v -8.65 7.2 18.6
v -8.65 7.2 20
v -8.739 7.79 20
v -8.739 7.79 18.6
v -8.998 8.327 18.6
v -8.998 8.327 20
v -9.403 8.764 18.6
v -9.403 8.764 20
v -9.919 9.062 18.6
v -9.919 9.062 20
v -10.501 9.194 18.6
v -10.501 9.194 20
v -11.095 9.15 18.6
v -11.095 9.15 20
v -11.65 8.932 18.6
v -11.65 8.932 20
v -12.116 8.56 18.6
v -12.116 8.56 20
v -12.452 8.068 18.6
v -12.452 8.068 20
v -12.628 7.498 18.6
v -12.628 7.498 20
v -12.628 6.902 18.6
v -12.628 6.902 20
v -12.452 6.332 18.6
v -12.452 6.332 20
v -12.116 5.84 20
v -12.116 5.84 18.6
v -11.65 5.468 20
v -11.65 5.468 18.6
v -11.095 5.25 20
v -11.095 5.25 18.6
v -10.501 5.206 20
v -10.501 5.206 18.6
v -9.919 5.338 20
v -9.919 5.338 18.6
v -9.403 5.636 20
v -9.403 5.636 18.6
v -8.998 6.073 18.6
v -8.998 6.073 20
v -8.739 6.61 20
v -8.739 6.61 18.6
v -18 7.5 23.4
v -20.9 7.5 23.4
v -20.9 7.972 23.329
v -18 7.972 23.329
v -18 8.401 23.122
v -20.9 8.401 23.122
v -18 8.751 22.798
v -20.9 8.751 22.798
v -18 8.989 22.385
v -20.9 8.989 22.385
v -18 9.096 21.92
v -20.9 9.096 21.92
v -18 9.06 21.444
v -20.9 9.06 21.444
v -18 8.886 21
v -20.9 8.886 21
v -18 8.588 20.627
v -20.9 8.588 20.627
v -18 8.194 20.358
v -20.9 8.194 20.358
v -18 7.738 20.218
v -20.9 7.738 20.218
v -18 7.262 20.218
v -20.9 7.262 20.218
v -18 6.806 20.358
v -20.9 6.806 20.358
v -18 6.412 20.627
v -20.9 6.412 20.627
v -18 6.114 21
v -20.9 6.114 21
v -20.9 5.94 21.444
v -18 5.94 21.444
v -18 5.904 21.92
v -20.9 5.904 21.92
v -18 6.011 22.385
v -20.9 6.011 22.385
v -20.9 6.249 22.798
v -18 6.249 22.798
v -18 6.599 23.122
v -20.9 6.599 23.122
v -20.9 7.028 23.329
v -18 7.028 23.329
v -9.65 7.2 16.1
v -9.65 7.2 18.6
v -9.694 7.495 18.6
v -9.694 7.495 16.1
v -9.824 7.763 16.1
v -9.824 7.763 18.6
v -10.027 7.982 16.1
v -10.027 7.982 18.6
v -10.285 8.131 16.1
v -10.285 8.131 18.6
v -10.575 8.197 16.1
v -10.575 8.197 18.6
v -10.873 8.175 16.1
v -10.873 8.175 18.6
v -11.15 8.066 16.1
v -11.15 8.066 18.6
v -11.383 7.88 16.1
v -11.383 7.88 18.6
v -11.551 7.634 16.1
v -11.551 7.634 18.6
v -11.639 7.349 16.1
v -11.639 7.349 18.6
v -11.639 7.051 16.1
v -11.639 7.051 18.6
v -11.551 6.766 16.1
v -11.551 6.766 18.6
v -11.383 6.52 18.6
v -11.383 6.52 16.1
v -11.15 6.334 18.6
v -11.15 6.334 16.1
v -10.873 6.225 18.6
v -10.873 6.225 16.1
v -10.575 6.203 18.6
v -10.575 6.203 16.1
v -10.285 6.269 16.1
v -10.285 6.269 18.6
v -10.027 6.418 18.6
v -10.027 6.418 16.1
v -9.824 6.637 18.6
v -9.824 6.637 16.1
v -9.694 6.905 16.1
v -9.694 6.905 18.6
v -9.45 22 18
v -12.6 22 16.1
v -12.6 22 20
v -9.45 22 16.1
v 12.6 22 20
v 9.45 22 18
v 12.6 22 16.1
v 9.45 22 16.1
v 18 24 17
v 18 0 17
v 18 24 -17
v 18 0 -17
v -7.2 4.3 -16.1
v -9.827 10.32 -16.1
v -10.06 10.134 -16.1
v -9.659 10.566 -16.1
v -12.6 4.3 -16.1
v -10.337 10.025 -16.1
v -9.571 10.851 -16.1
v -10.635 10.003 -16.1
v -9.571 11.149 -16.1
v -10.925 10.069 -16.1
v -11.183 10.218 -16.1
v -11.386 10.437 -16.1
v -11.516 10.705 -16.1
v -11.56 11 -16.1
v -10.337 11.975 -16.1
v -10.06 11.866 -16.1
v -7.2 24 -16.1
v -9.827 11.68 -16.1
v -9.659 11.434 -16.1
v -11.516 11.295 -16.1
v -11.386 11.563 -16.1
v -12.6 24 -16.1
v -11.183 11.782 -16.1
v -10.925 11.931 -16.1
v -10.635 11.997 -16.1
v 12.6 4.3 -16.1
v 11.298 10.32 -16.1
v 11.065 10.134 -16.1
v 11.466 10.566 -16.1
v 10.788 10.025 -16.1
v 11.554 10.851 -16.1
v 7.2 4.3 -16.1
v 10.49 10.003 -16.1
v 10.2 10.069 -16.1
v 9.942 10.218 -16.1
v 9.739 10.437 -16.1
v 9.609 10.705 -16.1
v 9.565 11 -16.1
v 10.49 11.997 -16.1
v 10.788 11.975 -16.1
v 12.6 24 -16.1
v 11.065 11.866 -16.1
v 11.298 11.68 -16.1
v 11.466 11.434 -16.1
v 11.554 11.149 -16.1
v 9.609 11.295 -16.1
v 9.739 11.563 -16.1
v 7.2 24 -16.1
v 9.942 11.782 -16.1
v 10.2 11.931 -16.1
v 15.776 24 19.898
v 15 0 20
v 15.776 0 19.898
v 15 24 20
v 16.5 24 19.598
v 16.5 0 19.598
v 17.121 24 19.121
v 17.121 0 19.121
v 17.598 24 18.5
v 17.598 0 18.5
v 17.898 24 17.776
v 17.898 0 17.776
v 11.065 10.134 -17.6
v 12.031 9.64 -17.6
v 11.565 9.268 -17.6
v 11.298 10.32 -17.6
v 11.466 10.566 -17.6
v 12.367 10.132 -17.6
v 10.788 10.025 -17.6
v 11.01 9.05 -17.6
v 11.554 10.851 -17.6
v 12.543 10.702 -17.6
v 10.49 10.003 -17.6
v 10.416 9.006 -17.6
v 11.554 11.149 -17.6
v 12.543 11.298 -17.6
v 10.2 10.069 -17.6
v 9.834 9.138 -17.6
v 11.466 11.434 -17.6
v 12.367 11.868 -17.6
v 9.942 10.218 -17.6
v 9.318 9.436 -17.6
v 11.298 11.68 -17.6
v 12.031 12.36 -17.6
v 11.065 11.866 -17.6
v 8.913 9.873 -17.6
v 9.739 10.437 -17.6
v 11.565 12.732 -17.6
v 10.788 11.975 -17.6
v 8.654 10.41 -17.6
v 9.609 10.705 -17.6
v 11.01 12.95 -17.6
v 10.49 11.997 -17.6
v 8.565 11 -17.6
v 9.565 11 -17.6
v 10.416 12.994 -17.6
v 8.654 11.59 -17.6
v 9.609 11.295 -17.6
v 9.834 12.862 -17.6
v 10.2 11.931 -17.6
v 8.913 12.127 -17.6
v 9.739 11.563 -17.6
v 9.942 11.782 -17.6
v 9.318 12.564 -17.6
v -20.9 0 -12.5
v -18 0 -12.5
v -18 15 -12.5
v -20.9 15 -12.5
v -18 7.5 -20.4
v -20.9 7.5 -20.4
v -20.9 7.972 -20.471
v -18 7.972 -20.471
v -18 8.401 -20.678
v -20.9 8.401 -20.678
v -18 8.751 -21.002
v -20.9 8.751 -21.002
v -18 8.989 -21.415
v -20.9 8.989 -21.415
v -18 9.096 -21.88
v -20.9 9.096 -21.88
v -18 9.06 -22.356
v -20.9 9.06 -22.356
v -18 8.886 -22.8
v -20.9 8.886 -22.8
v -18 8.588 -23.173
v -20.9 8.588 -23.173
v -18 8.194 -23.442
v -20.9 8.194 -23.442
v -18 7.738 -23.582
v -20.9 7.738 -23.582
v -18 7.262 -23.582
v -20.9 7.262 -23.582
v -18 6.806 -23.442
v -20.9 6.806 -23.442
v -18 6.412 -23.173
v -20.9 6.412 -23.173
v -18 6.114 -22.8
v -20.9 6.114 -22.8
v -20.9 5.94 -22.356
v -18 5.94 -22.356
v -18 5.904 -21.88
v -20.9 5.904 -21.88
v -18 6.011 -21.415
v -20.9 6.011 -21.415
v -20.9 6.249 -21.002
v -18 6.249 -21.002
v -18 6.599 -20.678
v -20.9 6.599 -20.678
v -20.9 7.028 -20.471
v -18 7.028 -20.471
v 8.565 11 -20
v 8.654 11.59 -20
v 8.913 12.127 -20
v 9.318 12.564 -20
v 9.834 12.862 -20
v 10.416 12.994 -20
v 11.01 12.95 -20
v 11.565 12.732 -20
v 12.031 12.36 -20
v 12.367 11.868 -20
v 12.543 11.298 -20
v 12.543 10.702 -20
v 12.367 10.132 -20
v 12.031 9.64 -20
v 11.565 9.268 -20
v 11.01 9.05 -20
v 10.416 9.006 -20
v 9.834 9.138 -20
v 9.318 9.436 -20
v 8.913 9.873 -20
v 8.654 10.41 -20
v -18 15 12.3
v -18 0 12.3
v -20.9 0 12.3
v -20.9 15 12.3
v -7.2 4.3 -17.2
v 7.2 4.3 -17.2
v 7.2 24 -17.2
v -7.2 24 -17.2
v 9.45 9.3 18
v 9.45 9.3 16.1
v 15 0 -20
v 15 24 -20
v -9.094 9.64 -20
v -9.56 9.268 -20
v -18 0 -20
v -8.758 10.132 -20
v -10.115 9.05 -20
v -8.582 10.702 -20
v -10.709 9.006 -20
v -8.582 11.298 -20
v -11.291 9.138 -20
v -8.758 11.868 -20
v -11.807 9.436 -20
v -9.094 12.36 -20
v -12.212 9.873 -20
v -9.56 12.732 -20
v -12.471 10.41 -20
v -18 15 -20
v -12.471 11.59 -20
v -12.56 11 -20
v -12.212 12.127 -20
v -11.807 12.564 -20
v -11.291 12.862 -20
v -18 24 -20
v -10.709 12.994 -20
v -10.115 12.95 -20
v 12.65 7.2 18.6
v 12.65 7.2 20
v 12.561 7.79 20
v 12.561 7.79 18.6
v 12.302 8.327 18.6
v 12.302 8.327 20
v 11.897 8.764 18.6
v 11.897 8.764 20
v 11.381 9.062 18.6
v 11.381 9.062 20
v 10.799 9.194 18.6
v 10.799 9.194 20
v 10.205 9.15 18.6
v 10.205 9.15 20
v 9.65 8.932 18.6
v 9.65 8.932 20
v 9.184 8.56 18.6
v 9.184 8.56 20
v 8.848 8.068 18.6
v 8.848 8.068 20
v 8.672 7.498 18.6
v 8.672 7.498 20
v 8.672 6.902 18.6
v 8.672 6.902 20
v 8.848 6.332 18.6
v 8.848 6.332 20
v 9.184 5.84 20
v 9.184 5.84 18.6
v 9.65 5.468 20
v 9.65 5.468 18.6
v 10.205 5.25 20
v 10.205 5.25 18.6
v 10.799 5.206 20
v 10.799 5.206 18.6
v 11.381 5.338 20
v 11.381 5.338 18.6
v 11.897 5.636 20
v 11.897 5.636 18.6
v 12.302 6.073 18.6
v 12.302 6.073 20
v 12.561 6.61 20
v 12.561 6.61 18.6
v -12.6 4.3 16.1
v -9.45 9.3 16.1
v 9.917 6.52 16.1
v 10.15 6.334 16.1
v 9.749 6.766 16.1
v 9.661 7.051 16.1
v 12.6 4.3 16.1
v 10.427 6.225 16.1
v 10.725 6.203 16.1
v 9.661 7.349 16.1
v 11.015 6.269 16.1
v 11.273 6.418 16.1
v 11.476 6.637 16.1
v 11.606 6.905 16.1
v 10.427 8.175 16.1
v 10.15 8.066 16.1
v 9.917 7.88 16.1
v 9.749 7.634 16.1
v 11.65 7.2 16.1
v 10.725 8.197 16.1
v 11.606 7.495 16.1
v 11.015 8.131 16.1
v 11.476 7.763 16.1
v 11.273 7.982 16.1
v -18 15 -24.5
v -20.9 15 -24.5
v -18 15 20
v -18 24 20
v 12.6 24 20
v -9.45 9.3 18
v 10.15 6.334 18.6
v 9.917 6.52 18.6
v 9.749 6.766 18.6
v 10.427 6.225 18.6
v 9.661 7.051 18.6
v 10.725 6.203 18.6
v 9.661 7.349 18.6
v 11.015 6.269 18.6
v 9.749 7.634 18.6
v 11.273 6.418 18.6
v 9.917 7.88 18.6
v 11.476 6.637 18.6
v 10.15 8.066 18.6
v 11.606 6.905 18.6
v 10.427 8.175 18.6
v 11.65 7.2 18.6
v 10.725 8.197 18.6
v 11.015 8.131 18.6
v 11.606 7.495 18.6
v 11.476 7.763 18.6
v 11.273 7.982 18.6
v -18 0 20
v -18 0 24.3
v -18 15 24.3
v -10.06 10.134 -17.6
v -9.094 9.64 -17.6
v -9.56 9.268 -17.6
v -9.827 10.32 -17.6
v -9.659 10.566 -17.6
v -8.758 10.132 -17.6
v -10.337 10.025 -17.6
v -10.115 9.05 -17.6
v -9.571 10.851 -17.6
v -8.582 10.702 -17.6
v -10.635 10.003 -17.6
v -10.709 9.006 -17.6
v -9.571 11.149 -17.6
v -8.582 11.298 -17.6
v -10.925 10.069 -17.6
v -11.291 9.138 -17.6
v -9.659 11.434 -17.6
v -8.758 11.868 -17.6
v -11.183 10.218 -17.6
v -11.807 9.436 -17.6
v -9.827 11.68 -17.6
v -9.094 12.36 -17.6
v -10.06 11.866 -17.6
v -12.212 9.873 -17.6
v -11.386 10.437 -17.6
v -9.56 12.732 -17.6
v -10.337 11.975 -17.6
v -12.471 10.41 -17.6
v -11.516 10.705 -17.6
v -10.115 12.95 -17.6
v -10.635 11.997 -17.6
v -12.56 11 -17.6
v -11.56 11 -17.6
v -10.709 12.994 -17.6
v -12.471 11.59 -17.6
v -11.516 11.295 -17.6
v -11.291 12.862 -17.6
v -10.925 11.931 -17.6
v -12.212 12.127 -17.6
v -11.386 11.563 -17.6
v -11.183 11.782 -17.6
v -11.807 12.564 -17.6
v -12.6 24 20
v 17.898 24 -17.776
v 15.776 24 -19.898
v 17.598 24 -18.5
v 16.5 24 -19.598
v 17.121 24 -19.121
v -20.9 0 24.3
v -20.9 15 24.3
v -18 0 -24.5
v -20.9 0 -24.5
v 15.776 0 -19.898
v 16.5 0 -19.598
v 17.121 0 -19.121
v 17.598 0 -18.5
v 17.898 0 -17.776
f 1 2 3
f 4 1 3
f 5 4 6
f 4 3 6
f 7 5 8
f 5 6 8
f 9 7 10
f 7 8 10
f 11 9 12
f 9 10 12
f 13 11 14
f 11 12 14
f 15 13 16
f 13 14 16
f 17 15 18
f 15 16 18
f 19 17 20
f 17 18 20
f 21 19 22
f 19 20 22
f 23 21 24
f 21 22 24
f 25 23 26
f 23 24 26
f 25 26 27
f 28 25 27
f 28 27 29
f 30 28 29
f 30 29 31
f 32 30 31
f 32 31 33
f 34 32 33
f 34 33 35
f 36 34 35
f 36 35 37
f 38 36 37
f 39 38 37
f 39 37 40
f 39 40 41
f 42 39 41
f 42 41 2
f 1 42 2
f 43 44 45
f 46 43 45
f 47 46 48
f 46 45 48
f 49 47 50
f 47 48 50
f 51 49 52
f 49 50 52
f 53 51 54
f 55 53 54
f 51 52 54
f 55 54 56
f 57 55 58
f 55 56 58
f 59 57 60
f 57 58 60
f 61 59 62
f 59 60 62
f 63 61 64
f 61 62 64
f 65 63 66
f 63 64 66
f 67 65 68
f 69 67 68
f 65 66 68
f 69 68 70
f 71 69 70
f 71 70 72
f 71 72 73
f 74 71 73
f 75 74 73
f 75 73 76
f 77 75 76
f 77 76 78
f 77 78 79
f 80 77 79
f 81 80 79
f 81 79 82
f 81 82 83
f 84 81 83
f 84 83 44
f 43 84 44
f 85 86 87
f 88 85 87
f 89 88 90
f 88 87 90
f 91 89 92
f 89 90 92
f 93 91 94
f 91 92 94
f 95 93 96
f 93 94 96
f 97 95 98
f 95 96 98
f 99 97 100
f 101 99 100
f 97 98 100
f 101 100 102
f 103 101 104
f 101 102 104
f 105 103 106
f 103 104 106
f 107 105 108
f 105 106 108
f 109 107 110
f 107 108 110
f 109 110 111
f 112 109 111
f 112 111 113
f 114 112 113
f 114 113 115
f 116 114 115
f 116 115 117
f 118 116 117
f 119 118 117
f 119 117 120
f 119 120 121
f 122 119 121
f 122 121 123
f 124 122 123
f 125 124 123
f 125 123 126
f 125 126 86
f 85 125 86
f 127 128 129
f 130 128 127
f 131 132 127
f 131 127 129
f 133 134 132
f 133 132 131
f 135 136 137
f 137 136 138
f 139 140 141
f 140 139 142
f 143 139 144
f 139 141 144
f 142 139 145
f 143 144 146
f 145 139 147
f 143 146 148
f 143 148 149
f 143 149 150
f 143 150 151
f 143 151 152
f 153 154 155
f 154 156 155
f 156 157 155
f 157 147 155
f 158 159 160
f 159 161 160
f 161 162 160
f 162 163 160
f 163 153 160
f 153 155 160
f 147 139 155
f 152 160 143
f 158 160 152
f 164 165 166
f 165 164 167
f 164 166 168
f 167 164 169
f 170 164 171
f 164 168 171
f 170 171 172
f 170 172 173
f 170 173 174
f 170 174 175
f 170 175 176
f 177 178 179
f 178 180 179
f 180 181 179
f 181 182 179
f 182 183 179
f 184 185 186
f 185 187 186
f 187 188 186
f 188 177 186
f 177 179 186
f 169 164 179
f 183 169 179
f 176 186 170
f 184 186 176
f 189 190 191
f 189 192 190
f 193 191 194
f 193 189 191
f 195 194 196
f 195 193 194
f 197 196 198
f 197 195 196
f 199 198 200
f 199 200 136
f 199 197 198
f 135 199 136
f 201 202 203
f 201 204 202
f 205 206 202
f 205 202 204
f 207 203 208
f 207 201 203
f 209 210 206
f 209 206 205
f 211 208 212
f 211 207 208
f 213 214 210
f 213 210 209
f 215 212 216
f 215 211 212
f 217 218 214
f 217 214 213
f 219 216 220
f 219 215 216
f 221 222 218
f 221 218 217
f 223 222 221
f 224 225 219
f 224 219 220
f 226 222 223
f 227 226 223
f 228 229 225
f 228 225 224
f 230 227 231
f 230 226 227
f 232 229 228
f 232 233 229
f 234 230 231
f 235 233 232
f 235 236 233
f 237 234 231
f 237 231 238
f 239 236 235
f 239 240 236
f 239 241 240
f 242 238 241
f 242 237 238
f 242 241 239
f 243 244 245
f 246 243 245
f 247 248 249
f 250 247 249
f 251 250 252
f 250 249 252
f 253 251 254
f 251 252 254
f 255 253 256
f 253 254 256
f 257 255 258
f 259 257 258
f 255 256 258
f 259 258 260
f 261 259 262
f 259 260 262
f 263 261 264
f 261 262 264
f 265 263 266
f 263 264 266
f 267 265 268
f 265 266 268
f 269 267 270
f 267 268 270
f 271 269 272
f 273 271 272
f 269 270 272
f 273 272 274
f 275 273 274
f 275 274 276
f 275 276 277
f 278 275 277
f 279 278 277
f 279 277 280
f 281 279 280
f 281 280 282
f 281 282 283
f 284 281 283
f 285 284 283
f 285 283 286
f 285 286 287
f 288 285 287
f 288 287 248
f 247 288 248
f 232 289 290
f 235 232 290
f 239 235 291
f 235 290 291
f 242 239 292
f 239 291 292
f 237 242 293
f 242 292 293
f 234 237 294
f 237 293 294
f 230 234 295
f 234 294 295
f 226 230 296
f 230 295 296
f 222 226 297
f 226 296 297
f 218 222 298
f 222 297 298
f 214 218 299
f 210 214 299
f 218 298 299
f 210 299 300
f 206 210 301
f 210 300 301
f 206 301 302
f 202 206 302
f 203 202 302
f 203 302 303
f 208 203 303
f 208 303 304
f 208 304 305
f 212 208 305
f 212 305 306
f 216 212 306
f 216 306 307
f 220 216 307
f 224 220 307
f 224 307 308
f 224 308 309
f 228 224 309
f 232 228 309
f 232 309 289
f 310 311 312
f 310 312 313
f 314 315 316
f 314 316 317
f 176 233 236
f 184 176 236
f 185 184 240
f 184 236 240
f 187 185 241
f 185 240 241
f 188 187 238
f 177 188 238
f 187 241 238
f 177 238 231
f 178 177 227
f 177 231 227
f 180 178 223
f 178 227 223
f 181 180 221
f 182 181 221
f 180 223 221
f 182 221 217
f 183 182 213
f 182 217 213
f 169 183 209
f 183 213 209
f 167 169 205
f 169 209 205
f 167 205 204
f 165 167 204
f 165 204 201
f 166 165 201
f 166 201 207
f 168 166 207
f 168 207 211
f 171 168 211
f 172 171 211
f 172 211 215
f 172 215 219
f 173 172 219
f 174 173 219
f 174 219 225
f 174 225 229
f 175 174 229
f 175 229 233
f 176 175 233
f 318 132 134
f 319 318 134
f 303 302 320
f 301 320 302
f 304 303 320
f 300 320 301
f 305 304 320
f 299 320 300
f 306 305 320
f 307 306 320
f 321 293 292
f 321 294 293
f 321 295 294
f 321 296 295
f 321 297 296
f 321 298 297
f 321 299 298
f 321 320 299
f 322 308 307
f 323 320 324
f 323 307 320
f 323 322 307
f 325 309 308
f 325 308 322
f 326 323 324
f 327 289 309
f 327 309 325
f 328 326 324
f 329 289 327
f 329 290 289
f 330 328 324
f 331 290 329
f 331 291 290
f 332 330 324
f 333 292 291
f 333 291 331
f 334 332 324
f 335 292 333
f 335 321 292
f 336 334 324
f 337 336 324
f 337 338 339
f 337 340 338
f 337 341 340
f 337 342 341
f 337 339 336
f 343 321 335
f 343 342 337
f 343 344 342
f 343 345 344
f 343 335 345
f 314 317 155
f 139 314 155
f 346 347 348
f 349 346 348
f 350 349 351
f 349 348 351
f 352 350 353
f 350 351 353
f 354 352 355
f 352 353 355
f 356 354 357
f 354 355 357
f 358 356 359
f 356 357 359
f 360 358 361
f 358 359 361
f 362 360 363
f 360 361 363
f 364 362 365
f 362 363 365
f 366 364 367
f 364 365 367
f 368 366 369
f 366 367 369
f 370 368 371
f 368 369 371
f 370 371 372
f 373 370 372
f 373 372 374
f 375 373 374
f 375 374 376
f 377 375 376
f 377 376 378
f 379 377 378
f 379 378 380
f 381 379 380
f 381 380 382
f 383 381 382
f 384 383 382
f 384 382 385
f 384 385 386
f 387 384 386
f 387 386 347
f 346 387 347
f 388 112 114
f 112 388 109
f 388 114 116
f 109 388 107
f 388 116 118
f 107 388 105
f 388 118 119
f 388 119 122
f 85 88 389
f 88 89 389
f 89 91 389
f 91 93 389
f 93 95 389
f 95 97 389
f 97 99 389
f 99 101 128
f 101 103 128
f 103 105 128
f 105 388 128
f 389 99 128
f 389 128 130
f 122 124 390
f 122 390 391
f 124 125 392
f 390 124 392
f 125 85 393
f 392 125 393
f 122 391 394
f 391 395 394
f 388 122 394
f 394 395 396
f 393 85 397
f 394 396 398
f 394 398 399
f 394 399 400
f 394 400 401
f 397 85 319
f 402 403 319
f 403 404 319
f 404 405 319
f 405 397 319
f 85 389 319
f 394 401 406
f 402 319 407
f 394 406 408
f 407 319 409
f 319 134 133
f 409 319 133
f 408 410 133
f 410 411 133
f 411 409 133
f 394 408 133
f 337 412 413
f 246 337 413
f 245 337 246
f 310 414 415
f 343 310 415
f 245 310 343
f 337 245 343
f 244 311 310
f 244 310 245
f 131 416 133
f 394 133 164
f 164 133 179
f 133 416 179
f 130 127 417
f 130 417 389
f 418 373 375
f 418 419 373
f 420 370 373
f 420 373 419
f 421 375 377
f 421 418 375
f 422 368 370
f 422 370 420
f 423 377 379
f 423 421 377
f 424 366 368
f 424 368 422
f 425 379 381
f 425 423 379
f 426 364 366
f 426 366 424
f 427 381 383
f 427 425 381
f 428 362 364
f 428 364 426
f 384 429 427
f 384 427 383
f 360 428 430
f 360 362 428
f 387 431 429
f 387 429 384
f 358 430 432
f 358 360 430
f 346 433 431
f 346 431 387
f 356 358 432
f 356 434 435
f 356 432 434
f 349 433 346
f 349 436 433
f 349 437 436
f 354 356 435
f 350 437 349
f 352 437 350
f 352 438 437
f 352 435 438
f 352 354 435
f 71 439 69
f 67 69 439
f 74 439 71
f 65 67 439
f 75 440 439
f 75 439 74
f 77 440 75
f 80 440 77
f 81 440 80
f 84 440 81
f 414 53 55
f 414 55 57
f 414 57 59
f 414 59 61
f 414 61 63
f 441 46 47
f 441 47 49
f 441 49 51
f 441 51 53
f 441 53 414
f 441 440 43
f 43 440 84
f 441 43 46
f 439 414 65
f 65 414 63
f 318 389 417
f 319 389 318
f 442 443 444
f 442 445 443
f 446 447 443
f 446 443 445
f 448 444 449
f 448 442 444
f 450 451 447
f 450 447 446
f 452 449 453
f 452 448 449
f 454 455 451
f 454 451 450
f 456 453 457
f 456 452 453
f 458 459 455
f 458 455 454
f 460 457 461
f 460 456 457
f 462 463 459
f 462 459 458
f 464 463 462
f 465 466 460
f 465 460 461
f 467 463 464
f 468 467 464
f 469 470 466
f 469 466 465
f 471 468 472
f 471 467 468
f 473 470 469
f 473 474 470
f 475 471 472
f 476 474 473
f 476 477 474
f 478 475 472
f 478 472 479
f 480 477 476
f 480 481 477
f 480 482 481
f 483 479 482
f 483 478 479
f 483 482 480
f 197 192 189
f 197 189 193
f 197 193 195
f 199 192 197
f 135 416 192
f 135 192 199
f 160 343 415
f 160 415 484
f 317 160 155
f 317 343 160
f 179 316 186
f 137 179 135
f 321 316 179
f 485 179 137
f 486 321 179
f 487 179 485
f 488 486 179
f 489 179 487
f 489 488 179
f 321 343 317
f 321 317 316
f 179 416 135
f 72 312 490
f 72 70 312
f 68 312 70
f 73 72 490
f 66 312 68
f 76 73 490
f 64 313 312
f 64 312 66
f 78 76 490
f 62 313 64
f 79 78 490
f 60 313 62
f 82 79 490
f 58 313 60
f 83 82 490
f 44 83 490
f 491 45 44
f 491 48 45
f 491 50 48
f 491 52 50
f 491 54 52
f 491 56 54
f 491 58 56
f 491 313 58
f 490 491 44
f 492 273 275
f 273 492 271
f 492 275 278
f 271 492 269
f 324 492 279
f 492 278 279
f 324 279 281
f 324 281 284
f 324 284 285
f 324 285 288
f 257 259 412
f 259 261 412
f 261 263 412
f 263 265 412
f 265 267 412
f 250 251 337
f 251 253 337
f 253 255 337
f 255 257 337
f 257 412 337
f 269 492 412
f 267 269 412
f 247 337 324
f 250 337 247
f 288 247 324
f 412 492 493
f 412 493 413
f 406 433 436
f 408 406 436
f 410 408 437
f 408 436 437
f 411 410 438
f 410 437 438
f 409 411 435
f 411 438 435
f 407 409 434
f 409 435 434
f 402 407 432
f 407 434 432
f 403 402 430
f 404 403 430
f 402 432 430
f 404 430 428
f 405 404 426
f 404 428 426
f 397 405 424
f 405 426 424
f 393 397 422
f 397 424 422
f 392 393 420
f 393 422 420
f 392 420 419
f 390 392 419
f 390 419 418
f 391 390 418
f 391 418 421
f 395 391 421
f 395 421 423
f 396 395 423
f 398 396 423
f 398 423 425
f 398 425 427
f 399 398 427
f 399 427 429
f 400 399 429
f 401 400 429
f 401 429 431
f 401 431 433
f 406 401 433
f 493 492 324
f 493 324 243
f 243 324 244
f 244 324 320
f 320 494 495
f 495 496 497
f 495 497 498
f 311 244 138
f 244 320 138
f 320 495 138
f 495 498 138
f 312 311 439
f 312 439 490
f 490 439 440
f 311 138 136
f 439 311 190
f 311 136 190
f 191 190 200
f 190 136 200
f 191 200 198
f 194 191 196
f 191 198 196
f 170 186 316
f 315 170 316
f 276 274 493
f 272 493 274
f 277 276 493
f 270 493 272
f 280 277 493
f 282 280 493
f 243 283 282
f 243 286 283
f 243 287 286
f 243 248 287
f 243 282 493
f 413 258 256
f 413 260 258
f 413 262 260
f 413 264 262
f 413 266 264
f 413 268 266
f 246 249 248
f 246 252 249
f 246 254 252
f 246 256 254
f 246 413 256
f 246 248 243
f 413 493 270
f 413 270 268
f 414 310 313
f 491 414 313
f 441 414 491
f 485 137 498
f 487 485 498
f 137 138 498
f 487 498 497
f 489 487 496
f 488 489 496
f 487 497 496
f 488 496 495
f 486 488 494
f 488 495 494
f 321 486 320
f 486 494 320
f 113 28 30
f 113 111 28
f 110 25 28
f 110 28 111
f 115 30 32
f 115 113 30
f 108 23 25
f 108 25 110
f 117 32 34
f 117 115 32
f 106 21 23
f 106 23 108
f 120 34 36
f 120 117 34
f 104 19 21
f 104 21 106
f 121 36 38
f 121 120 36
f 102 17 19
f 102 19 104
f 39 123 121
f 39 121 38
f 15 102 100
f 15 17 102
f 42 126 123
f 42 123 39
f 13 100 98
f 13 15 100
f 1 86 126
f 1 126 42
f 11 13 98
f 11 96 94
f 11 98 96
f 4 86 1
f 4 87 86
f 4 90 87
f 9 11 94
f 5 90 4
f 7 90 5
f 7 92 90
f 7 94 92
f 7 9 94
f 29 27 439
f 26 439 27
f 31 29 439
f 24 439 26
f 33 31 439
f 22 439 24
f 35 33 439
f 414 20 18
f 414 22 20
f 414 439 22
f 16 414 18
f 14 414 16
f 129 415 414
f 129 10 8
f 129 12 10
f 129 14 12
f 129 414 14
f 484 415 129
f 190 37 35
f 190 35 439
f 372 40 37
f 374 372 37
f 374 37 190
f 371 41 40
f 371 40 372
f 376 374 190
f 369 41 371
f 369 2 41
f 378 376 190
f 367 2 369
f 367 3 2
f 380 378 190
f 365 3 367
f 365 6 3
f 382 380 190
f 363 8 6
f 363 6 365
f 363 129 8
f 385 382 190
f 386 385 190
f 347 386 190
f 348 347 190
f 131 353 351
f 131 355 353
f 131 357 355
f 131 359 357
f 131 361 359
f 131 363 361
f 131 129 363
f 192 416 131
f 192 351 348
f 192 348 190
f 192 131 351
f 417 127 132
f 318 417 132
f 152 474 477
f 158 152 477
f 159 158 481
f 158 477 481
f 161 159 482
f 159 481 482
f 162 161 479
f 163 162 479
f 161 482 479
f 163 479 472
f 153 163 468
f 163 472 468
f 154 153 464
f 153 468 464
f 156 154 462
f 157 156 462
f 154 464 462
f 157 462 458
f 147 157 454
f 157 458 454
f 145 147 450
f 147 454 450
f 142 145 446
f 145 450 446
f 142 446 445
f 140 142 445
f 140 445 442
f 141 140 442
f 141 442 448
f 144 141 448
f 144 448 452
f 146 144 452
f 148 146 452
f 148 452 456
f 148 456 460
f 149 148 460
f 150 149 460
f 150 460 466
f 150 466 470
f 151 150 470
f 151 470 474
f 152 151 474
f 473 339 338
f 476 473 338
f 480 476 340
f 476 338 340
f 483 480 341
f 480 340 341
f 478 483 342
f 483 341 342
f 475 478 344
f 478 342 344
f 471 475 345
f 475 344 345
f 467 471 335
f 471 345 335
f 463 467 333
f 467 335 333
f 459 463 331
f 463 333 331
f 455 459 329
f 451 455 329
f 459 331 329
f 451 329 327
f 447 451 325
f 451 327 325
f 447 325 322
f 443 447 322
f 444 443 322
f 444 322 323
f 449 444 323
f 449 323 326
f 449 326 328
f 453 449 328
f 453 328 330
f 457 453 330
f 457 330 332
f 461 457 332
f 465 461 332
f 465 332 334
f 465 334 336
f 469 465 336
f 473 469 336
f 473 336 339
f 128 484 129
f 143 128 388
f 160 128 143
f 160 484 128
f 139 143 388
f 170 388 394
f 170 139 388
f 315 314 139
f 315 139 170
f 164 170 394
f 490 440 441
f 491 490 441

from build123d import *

# Parameters (mm, degrees)
SKETCH_3_W           = 36
SKETCH_3_H           = 50
EXTRUDE_1_DEPTH      = 24
SKETCH_4_W           = 24.8
SKETCH_4_H           = 31.8
CUT_EXTRUDE_1_DEPTH  = 19.7
SKETCH_5_W           = 14
SKETCH_5_H           = 2.2
CUT_EXTRUDE_3_DEPTH  = 19.7
SKETCH_6_W           = 18.5
SKETCH_6_H           = 3.8
CUT_EXTRUDE_4_DEPTH  = 14.7
SKETCH_7_W           = 24.8
SKETCH_7_H           = 24.280407208
CUT_EXTRUDE_5_DEPTH  = 2
SKETCH_8_R           = 2
CUT_EXTRUDE_6_DEPTH  = 6.4
SKETCH_9_R           = 1
CUT_EXTRUDE_7_DEPTH  = 6.4
SKETCH_10_R          = 2
CUT_EXTRUDE_8_DEPTH  = 7.4
SKETCH_11_R          = 1
CUT_EXTRUDE_9_DEPTH  = 7.4
SKETCH_14_W          = 47.693248889
SKETCH_14_H          = 41.94352182
CUT_EXTRUDE_12_DEPTH = 4
SKETCH_16_W          = 69.166934332
SKETCH_16_H          = 39.422219991
CUT_EXTRUDE_13_DEPTH = 5
CUT_EXTRUDE_17_DEPTH = 19.7
SKETCH_19_W          = 18.9
SKETCH_19_H          = 2.1
CUT_EXTRUDE_18_DEPTH = 12.7
SKETCH_21_W          = 12
SKETCH_21_H          = 15
EXTRUDE_2_DEPTH      = 2.9
SKETCH_24_W          = 40.92959711
SKETCH_24_H          = 30.072359406
CUT_EXTRUDE_20_DEPTH = 1
SKETCH_23_R          = 1.6
CUT_EXTRUDE_21_DEPTH = 10
SKETCH_25_W          = 25.2
SKETCH_25_H          = 37.099500986
CUT_EXTRUDE_22_DEPTH = 2
FILLET_1_R           = 3


with BuildPart() as part:
    # 草图3 → 凸台-拉伸1 (new body)
    with BuildSketch(Plane(origin=(0, 0, 0), x_dir=(1, 0, 0), z_dir=(0, 1, 0))):
        Rectangle(SKETCH_3_W, SKETCH_3_H)
    extrude(amount=EXTRUDE_1_DEPTH)

    # 草图4 → 切除-拉伸1 (cut)
    with BuildSketch(Plane(origin=(0, 24, 0), x_dir=(1, 0, 0), z_dir=(0, 1, 0))):
        Rectangle(SKETCH_4_W, SKETCH_4_H)
    extrude(amount=-CUT_EXTRUDE_1_DEPTH, mode=Mode.SUBTRACT)

    # 草图5 → 切除-拉伸3 (cut)
    with BuildSketch(Plane(origin=(0, 24, 0), x_dir=(1, 0, 0), z_dir=(0, 1, 0))):
        with Locations((0, 15.9)):
            Rectangle(SKETCH_5_W, SKETCH_5_H)
    extrude(amount=-CUT_EXTRUDE_3_DEPTH, mode=Mode.SUBTRACT)

    # 草图6 → 切除-拉伸4 (cut)
    with BuildSketch(Plane(origin=(0, 24, 0), x_dir=(1, 0, 0), z_dir=(0, 1, 0))):
        with Locations((0, -15.9)):
            Rectangle(SKETCH_6_W, SKETCH_6_H)
    extrude(amount=-CUT_EXTRUDE_4_DEPTH, mode=Mode.SUBTRACT)

    # 草图7 → 切除-拉伸5 (cut)
    with BuildSketch(Plane(origin=(0, 24, 0), x_dir=(1, 0, 0), z_dir=(0, 1, 0))):
        with Locations((0, -25)):
            Rectangle(SKETCH_7_W, SKETCH_7_H)
    extrude(amount=-CUT_EXTRUDE_5_DEPTH, mode=Mode.SUBTRACT)

    # 草图8 → 切除-拉伸6 (cut)
    with BuildSketch(Plane.XY.offset(25)):
        with Locations((10.65, 7.2)):
            Circle(SKETCH_8_R)
        with Locations((-10.65, 7.2)):
            Circle(SKETCH_8_R)
    extrude(amount=-CUT_EXTRUDE_6_DEPTH, mode=Mode.SUBTRACT)

    # 草图9 → 切除-拉伸7 (cut)
    with BuildSketch(Plane.XY.offset(18.6)):
        with Locations((10.65, 7.2)):
            Circle(SKETCH_9_R)
        with Locations((-10.65, 7.2)):
            Circle(SKETCH_9_R)
    extrude(amount=-CUT_EXTRUDE_7_DEPTH, mode=Mode.SUBTRACT)

    # 草图10 → 切除-拉伸8 (cut)
    with BuildSketch(Plane(origin=(0, 0, -25), x_dir=(-1, 0, 0), z_dir=(0, 0, -1))):
        with Locations((-10.565, 11)):
            Circle(SKETCH_10_R)
        with Locations((10.56, 11)):
            Circle(SKETCH_10_R)
    extrude(amount=-CUT_EXTRUDE_8_DEPTH, mode=Mode.SUBTRACT)

    # 草图11 → 切除-拉伸9 (cut)
    with BuildSketch(Plane(origin=(0, 0, -17.6), x_dir=(-1, 0, 0), z_dir=(0, 0, -1))):
        with Locations((10.56, 11)):
            Circle(SKETCH_11_R)
        with Locations((-10.565, 11)):
            Circle(SKETCH_11_R)
    extrude(amount=-CUT_EXTRUDE_9_DEPTH, mode=Mode.SUBTRACT)

    # 草图14 → 切除-拉伸12 (cut)
    with BuildSketch(Plane.XY.offset(25)):
        with Locations((-2.653720185, 12.393348568)):
            Rectangle(SKETCH_14_W, SKETCH_14_H)
    extrude(amount=-CUT_EXTRUDE_12_DEPTH, mode=Mode.SUBTRACT)

    # 草图16 → 切除-拉伸13 (cut)
    with BuildSketch(Plane(origin=(0, 0, -25), x_dir=(-1, 0, 0), z_dir=(0, 0, -1))):
        with Locations((0.858826259, 12.588310345)):
            Rectangle(SKETCH_16_W, SKETCH_16_H)
    extrude(amount=-CUT_EXTRUDE_13_DEPTH, mode=Mode.SUBTRACT)

    # 草图18 → 切除-拉伸17 (cut)
    with BuildSketch(Plane(origin=(0, 24, 0), x_dir=(1, 0, 0), z_dir=(0, 1, 0))):
        Polygon((-12.6, -16.1), (12.6, -16.1), (12.6, 16.1), (7.2, 16.1), (7.2, 17.2), (-7.2, 17.2), (-7.2, 16.1), (-12.6, 16.1), align=None)
    extrude(amount=-CUT_EXTRUDE_17_DEPTH, mode=Mode.SUBTRACT)

    # 草图19 → 切除-拉伸18 (cut)
    with BuildSketch(Plane(origin=(0, 22, 0), x_dir=(1, 0, 0), z_dir=(0, 1, 0))):
        with Locations((0, -16.95)):
            Rectangle(SKETCH_19_W, SKETCH_19_H)
    extrude(amount=-CUT_EXTRUDE_18_DEPTH, mode=Mode.SUBTRACT)

    # 草图21 → 凸台-拉伸2 (add)
    with BuildSketch(Plane.ZY.offset(18)):
        with Locations((-18.5, 7.5)):
            Rectangle(SKETCH_21_W, SKETCH_21_H)
        with Locations((18.3, 7.5)):
            Rectangle(SKETCH_21_W, SKETCH_21_H)
    extrude(amount=EXTRUDE_2_DEPTH)

    # 草图24 → 切除-拉伸20 (cut)
    with BuildSketch(Plane.XY.offset(21)):
        with Locations((2.464798555, 15.036179703)):
            Rectangle(SKETCH_24_W, SKETCH_24_H)
    extrude(amount=-CUT_EXTRUDE_20_DEPTH, mode=Mode.SUBTRACT)

    # 草图23 → 切除-拉伸21 (cut)
    with BuildSketch(Plane.ZY.offset(20.9)):
        with Locations((-22, 7.5)):
            Circle(SKETCH_23_R)
        with Locations((21.8, 7.5)):
            Circle(SKETCH_23_R)
    extrude(amount=-CUT_EXTRUDE_21_DEPTH, mode=Mode.SUBTRACT)

    # 草图25 → 切除-拉伸22 (cut)
    with BuildSketch(Plane(origin=(0, 24, 0), x_dir=(1, 0, 0), z_dir=(0, 1, 0))):
        with Locations((0, -2.449750493)):
            Rectangle(SKETCH_25_W, SKETCH_25_H)
    extrude(amount=-CUT_EXTRUDE_22_DEPTH, mode=Mode.SUBTRACT)

    # 圆角1
    fillet_1_edges = [part.edges().sort_by_distance(p)[0] for p in [
        (18, 12, -20),
        (18, 12, 20),
    ]]
    fillet(fillet_1_edges, radius=FILLET_1_R)


solid = part.part
